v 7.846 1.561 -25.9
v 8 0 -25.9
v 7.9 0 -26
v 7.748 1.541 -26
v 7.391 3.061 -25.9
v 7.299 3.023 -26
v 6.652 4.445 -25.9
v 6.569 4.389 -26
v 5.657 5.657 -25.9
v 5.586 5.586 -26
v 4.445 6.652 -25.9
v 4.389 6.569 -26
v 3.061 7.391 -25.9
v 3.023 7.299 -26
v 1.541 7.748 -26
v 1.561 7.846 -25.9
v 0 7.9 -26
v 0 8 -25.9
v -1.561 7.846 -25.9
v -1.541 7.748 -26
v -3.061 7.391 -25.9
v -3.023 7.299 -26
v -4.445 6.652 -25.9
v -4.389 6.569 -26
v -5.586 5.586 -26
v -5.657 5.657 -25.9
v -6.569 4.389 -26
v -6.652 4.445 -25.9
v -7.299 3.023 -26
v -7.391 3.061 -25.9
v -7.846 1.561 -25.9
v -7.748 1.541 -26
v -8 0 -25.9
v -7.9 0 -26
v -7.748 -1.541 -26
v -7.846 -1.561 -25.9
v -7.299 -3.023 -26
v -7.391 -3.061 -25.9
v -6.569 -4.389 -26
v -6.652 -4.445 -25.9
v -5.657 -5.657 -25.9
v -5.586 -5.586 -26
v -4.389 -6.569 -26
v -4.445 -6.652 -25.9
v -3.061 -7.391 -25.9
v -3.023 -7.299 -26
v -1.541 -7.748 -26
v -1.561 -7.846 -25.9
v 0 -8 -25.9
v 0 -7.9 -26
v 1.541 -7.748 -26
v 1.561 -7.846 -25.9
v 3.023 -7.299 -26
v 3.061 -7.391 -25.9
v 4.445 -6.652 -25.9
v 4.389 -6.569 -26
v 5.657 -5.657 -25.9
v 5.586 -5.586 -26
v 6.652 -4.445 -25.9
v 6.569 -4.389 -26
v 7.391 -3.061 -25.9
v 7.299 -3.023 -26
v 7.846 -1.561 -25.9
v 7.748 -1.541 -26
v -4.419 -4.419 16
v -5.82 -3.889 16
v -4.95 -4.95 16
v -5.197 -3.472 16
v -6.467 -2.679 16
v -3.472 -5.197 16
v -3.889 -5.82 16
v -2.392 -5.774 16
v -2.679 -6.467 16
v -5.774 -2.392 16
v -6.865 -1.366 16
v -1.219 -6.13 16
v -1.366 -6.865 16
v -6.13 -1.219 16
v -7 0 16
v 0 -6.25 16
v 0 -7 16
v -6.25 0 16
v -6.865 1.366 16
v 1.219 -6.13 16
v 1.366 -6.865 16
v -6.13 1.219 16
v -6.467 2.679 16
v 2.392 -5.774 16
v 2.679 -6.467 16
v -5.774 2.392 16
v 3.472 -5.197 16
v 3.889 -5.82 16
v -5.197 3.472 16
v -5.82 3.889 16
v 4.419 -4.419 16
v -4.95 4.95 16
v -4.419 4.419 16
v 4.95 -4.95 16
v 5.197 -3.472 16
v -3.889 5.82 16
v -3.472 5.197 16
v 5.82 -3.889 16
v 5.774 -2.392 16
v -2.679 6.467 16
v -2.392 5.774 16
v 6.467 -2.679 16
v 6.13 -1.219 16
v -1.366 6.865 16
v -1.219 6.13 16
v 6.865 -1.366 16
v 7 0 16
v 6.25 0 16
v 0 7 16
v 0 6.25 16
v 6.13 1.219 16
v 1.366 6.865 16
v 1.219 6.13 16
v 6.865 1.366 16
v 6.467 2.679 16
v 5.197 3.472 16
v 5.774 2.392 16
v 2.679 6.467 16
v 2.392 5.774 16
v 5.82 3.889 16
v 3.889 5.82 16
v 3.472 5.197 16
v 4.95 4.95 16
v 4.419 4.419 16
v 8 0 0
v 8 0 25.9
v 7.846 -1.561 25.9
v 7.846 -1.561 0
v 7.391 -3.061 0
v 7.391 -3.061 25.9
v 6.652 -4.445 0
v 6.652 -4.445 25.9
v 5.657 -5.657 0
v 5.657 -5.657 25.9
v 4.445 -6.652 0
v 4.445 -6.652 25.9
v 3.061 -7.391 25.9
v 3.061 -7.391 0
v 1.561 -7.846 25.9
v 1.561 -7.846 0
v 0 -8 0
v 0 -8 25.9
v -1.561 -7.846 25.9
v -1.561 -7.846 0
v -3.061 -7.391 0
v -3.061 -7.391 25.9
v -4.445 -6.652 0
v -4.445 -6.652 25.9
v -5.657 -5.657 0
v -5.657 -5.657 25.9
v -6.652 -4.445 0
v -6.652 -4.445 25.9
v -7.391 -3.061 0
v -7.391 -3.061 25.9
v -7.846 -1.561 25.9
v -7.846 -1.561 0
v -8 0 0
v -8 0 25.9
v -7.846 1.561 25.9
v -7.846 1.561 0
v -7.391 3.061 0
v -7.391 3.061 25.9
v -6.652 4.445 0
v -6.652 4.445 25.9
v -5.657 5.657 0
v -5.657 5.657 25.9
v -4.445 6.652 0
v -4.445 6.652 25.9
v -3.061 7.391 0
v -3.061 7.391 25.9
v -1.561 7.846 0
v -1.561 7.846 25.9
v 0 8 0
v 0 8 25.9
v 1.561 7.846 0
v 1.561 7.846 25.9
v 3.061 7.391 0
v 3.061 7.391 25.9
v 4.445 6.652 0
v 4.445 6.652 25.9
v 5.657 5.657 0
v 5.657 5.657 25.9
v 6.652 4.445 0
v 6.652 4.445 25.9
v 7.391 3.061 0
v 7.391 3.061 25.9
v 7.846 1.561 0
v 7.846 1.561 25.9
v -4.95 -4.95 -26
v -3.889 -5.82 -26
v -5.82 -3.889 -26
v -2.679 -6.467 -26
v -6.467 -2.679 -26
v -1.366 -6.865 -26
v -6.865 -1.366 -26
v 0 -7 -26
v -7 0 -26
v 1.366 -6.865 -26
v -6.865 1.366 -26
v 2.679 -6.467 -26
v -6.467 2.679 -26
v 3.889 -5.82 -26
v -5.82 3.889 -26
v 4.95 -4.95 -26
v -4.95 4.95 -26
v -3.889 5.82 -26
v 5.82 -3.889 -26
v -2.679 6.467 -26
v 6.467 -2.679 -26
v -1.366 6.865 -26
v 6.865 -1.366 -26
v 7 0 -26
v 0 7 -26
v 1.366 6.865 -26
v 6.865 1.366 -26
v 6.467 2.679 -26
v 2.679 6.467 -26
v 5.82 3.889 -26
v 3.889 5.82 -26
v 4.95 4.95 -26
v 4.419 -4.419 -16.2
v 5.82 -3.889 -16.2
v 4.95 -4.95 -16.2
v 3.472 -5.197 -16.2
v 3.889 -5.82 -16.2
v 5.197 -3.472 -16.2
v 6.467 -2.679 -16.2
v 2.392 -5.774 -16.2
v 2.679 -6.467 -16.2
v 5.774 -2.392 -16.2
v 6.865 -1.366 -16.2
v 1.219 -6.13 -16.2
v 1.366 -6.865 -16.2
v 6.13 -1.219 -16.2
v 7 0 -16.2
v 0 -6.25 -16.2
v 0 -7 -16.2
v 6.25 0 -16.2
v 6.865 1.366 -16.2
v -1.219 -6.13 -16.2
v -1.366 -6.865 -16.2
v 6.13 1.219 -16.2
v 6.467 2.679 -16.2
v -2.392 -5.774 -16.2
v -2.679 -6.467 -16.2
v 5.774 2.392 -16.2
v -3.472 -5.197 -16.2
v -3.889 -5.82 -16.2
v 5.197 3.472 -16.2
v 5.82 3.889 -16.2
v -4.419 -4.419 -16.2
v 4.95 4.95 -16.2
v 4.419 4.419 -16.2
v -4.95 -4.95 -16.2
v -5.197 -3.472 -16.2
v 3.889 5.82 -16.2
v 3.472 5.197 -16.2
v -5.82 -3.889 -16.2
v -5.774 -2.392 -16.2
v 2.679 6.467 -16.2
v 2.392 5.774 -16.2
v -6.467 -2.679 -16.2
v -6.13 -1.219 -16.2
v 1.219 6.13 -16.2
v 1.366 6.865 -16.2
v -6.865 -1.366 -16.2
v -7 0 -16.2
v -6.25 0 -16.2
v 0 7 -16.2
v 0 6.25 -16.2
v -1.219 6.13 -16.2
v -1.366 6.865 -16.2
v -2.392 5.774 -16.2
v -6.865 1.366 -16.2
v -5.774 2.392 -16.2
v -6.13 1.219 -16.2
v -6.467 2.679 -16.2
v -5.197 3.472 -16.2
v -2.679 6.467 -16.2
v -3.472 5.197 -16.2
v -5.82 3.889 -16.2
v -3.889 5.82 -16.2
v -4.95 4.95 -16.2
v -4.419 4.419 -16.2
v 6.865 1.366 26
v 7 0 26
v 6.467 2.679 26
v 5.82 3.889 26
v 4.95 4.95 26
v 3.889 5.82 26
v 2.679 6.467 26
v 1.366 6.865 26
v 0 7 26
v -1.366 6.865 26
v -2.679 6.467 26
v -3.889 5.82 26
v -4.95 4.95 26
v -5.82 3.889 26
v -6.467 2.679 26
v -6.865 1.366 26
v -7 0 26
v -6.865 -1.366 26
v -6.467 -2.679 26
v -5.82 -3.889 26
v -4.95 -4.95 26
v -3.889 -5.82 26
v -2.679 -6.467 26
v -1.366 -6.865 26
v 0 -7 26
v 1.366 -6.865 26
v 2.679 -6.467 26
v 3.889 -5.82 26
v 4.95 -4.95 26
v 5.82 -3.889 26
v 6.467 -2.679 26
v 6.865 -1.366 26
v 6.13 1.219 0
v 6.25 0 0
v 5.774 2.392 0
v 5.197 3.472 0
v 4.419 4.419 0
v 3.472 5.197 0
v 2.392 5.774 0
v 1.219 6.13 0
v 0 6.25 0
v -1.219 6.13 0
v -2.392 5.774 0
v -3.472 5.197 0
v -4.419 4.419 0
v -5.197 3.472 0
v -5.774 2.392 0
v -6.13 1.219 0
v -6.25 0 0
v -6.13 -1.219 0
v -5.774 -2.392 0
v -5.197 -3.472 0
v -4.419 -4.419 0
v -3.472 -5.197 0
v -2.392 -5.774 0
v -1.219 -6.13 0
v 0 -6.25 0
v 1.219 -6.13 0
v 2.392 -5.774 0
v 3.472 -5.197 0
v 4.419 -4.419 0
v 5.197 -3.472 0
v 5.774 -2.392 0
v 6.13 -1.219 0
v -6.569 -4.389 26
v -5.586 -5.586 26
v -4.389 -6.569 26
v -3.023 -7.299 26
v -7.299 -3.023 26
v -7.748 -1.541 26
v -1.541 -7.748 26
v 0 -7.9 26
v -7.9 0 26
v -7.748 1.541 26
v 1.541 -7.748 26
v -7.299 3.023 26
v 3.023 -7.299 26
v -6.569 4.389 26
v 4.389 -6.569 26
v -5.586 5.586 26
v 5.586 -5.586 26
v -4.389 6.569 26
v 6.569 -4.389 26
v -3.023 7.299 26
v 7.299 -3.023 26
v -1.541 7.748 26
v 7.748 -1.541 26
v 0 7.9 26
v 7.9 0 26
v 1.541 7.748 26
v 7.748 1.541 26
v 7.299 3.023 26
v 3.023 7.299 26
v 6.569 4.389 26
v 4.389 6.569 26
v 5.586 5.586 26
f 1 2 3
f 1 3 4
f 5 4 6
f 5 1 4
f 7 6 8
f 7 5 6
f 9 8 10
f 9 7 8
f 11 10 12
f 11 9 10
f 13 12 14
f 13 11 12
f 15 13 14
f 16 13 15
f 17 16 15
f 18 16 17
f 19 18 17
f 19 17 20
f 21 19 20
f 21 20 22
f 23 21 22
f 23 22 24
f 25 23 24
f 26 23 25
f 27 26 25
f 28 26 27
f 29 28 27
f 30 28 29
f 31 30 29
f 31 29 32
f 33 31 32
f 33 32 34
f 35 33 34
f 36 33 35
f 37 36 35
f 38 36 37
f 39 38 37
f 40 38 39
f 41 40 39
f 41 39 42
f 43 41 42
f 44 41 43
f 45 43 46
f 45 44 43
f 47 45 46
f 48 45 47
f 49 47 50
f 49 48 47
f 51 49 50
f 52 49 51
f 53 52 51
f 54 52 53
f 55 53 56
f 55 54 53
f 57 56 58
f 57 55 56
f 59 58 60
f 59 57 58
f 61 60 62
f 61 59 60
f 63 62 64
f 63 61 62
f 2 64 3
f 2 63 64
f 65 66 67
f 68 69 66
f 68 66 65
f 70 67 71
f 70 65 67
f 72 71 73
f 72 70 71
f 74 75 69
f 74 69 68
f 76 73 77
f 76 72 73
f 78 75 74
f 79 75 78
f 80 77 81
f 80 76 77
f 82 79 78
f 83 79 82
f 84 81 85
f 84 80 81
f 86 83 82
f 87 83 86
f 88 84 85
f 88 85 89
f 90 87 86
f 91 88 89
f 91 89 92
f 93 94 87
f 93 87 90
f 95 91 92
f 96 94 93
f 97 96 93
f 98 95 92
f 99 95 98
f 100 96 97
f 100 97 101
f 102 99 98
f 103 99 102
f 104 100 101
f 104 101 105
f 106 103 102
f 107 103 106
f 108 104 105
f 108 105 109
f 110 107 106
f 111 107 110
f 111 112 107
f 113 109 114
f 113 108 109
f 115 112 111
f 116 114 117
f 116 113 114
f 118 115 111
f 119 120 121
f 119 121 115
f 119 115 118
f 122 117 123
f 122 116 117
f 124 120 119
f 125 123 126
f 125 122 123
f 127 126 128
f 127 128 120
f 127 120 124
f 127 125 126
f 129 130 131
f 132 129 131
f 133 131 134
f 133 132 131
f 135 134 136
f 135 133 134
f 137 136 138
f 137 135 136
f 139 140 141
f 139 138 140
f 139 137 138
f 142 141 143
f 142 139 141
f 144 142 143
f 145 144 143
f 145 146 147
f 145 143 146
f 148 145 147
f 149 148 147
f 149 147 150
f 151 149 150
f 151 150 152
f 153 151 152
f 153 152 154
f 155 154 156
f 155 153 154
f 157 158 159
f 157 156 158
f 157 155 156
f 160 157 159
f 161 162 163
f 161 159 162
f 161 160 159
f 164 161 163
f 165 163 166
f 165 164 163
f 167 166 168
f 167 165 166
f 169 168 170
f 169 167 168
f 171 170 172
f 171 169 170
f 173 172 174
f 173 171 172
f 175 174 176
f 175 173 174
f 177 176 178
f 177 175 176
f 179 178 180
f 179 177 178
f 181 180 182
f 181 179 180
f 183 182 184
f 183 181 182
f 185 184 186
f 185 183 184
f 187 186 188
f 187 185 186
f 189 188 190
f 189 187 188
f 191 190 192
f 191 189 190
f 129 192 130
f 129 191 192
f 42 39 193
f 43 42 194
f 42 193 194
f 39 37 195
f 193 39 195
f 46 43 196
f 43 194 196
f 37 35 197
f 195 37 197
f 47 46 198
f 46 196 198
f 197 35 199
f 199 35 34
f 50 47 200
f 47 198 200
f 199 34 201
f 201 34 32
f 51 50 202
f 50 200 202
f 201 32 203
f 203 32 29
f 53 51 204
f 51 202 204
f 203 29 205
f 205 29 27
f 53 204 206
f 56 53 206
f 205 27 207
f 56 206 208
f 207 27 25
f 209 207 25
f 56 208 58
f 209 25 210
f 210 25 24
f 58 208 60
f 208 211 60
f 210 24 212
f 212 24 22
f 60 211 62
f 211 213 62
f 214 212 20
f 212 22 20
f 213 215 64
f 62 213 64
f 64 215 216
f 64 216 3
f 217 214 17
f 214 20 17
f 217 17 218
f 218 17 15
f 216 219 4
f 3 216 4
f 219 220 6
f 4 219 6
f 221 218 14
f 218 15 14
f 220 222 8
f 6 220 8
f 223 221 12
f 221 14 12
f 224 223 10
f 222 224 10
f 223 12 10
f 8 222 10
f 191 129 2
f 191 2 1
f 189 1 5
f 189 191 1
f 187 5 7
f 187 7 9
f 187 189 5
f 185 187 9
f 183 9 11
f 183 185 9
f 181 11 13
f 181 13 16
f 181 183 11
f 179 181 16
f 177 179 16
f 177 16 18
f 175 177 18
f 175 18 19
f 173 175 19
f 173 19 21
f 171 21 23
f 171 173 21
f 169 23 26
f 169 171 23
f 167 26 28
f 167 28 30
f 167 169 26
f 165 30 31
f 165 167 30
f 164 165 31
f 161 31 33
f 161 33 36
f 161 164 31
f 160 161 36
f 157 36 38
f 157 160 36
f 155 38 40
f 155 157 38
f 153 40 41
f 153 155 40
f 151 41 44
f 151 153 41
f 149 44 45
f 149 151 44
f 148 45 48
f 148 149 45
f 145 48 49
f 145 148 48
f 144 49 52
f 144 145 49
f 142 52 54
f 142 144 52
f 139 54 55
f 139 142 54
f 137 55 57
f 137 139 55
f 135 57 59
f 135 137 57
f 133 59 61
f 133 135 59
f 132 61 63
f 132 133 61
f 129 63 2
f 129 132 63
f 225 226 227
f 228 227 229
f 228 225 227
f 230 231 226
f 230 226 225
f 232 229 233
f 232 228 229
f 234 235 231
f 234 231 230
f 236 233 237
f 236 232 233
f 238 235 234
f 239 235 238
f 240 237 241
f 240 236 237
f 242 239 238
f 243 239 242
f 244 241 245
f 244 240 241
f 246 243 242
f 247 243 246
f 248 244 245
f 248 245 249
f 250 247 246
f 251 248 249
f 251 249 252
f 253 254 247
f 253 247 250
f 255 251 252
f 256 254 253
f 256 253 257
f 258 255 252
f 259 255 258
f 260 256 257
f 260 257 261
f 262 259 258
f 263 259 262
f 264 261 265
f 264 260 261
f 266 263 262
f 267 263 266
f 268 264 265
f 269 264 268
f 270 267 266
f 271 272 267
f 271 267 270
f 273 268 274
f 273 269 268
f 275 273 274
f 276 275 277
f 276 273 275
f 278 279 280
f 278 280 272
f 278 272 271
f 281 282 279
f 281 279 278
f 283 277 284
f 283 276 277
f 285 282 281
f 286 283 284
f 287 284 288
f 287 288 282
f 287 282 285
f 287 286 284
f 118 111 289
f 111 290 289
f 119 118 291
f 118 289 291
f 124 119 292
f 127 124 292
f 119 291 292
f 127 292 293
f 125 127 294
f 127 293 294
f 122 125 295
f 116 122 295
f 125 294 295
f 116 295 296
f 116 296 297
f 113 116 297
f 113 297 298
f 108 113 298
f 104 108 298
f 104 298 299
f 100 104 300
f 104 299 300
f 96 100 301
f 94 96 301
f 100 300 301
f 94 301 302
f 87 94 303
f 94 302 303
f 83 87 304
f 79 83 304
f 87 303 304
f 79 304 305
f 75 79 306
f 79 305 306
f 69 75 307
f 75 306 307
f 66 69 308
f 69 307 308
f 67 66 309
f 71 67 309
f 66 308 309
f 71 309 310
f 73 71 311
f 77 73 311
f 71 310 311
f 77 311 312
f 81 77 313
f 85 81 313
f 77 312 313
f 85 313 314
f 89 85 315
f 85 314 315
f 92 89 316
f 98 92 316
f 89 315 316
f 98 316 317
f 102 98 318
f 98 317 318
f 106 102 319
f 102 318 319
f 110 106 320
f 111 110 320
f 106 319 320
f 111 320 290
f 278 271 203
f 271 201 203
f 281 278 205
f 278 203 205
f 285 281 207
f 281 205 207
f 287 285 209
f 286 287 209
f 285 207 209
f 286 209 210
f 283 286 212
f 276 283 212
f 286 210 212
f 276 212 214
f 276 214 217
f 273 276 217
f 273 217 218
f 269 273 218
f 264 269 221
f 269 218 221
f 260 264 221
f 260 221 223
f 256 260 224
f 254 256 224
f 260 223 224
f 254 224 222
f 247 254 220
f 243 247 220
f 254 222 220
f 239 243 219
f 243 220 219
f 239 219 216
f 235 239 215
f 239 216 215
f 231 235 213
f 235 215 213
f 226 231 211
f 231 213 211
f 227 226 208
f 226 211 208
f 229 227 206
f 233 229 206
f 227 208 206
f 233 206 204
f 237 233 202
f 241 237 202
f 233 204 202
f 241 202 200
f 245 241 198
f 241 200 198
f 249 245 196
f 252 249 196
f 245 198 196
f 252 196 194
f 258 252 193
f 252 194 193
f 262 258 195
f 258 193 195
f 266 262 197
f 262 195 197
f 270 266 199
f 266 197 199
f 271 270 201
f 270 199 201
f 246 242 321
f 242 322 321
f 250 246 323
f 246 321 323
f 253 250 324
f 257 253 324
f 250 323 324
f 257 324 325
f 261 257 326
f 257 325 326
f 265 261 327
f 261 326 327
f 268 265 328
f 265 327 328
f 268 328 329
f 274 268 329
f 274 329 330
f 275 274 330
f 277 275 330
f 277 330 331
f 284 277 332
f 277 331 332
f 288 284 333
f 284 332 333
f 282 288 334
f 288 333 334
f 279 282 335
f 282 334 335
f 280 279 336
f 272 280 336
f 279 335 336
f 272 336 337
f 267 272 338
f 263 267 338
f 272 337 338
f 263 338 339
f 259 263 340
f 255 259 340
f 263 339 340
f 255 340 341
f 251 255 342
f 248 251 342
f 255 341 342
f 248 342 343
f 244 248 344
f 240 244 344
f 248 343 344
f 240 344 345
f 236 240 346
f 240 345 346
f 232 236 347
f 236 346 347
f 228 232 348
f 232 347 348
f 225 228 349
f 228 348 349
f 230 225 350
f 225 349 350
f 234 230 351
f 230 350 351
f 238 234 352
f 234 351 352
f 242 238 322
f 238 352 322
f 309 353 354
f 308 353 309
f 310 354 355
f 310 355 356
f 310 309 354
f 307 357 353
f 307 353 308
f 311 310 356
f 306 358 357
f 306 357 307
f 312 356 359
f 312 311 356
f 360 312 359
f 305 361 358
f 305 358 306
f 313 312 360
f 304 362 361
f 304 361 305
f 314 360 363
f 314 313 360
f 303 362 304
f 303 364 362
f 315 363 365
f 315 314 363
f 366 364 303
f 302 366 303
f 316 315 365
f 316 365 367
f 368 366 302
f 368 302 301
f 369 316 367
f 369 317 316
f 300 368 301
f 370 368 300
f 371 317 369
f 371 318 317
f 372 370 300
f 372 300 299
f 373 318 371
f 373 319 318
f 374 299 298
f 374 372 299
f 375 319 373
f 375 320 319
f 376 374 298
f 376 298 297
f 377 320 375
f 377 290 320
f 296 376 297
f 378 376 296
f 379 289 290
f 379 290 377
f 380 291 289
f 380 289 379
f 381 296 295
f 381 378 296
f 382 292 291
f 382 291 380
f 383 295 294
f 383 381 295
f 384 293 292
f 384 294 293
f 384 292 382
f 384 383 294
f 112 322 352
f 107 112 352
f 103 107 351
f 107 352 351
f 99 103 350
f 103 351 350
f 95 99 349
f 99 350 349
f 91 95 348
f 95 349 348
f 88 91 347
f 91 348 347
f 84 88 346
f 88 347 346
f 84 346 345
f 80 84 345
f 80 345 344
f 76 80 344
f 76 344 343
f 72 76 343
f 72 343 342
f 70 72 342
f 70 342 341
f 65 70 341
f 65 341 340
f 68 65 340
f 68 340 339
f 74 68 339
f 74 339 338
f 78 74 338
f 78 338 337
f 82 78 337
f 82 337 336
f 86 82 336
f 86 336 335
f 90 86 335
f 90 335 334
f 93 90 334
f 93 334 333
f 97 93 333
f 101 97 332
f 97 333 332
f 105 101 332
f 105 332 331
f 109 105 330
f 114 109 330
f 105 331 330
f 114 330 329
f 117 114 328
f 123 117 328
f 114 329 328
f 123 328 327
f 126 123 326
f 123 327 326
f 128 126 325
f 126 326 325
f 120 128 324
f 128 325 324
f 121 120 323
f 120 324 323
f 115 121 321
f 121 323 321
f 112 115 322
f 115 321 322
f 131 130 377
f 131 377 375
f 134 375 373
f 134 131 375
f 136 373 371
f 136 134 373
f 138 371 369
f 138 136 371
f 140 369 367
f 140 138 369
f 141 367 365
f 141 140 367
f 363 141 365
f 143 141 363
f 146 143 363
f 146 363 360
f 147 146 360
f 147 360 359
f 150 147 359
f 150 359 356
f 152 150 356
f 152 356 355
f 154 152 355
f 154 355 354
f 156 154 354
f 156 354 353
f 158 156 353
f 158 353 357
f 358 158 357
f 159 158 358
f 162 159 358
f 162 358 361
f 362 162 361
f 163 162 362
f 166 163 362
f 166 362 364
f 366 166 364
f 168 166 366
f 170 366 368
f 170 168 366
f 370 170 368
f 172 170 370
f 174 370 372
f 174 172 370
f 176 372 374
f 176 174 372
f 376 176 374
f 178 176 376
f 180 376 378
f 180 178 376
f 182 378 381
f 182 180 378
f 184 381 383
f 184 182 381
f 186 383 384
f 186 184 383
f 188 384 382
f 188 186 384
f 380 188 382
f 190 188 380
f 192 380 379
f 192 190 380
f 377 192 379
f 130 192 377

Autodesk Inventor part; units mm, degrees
ref_plane "YZ Plane" through (0, 0, 0) normal (1, 0, 0) x (0, 1, 0)
ref_plane "XZ Plane" through (0, 0, 0) normal (0, 1, 0) x (-1, 0, 0)
ref_plane "XY Plane" through (0, 0, 0) normal (0, 0, 1) x (1, 0, 0)
sketch "Sketch1" plane through (0, 0, 0) normal (0, 0, 1) x (1, 0, 0)
  circle A0 centre (0, 0) radius 6.25
  circle A1 centre (0, 0) radius 8
  dimension "d0" = 12.5
  dimension "d1" = 16
extrude "Extrusion1" add sketch "Sketch1" along normal mid plane 52
chamfer "Chamfer1" distance 0.1 angle 45 4 edges at (-6.25, 0, 26) (-8, 0, 26) (-6.25, 0, -26) (-8, 0, -26)
sketch "Sketch2" plane through (0, 0, 26) normal (0, 0, 1) x (1, 0, 0)
  point P0 (0, 0)
sketch "Sketch3" plane through (0, 0, 26) normal (0, 0, 1) x (1, 0, 0)
  circle A0 centre (0, 0) radius 7
  dimension "d7" = 14
extrude "Extrusion2" cut sketch "Sketch3" against normal blind 10
sketch "Sketch4" plane through (0, 0, -26) normal (0, 0, -1) x (-1, 0, 0)
  circle A0 centre (0, 0) radius 7
  dimension "d10" = 14
extrude "Extrusion3" cut sketch "Sketch4" against normal blind 9.8
properties part number "Joint1_Hand_Bushing"
